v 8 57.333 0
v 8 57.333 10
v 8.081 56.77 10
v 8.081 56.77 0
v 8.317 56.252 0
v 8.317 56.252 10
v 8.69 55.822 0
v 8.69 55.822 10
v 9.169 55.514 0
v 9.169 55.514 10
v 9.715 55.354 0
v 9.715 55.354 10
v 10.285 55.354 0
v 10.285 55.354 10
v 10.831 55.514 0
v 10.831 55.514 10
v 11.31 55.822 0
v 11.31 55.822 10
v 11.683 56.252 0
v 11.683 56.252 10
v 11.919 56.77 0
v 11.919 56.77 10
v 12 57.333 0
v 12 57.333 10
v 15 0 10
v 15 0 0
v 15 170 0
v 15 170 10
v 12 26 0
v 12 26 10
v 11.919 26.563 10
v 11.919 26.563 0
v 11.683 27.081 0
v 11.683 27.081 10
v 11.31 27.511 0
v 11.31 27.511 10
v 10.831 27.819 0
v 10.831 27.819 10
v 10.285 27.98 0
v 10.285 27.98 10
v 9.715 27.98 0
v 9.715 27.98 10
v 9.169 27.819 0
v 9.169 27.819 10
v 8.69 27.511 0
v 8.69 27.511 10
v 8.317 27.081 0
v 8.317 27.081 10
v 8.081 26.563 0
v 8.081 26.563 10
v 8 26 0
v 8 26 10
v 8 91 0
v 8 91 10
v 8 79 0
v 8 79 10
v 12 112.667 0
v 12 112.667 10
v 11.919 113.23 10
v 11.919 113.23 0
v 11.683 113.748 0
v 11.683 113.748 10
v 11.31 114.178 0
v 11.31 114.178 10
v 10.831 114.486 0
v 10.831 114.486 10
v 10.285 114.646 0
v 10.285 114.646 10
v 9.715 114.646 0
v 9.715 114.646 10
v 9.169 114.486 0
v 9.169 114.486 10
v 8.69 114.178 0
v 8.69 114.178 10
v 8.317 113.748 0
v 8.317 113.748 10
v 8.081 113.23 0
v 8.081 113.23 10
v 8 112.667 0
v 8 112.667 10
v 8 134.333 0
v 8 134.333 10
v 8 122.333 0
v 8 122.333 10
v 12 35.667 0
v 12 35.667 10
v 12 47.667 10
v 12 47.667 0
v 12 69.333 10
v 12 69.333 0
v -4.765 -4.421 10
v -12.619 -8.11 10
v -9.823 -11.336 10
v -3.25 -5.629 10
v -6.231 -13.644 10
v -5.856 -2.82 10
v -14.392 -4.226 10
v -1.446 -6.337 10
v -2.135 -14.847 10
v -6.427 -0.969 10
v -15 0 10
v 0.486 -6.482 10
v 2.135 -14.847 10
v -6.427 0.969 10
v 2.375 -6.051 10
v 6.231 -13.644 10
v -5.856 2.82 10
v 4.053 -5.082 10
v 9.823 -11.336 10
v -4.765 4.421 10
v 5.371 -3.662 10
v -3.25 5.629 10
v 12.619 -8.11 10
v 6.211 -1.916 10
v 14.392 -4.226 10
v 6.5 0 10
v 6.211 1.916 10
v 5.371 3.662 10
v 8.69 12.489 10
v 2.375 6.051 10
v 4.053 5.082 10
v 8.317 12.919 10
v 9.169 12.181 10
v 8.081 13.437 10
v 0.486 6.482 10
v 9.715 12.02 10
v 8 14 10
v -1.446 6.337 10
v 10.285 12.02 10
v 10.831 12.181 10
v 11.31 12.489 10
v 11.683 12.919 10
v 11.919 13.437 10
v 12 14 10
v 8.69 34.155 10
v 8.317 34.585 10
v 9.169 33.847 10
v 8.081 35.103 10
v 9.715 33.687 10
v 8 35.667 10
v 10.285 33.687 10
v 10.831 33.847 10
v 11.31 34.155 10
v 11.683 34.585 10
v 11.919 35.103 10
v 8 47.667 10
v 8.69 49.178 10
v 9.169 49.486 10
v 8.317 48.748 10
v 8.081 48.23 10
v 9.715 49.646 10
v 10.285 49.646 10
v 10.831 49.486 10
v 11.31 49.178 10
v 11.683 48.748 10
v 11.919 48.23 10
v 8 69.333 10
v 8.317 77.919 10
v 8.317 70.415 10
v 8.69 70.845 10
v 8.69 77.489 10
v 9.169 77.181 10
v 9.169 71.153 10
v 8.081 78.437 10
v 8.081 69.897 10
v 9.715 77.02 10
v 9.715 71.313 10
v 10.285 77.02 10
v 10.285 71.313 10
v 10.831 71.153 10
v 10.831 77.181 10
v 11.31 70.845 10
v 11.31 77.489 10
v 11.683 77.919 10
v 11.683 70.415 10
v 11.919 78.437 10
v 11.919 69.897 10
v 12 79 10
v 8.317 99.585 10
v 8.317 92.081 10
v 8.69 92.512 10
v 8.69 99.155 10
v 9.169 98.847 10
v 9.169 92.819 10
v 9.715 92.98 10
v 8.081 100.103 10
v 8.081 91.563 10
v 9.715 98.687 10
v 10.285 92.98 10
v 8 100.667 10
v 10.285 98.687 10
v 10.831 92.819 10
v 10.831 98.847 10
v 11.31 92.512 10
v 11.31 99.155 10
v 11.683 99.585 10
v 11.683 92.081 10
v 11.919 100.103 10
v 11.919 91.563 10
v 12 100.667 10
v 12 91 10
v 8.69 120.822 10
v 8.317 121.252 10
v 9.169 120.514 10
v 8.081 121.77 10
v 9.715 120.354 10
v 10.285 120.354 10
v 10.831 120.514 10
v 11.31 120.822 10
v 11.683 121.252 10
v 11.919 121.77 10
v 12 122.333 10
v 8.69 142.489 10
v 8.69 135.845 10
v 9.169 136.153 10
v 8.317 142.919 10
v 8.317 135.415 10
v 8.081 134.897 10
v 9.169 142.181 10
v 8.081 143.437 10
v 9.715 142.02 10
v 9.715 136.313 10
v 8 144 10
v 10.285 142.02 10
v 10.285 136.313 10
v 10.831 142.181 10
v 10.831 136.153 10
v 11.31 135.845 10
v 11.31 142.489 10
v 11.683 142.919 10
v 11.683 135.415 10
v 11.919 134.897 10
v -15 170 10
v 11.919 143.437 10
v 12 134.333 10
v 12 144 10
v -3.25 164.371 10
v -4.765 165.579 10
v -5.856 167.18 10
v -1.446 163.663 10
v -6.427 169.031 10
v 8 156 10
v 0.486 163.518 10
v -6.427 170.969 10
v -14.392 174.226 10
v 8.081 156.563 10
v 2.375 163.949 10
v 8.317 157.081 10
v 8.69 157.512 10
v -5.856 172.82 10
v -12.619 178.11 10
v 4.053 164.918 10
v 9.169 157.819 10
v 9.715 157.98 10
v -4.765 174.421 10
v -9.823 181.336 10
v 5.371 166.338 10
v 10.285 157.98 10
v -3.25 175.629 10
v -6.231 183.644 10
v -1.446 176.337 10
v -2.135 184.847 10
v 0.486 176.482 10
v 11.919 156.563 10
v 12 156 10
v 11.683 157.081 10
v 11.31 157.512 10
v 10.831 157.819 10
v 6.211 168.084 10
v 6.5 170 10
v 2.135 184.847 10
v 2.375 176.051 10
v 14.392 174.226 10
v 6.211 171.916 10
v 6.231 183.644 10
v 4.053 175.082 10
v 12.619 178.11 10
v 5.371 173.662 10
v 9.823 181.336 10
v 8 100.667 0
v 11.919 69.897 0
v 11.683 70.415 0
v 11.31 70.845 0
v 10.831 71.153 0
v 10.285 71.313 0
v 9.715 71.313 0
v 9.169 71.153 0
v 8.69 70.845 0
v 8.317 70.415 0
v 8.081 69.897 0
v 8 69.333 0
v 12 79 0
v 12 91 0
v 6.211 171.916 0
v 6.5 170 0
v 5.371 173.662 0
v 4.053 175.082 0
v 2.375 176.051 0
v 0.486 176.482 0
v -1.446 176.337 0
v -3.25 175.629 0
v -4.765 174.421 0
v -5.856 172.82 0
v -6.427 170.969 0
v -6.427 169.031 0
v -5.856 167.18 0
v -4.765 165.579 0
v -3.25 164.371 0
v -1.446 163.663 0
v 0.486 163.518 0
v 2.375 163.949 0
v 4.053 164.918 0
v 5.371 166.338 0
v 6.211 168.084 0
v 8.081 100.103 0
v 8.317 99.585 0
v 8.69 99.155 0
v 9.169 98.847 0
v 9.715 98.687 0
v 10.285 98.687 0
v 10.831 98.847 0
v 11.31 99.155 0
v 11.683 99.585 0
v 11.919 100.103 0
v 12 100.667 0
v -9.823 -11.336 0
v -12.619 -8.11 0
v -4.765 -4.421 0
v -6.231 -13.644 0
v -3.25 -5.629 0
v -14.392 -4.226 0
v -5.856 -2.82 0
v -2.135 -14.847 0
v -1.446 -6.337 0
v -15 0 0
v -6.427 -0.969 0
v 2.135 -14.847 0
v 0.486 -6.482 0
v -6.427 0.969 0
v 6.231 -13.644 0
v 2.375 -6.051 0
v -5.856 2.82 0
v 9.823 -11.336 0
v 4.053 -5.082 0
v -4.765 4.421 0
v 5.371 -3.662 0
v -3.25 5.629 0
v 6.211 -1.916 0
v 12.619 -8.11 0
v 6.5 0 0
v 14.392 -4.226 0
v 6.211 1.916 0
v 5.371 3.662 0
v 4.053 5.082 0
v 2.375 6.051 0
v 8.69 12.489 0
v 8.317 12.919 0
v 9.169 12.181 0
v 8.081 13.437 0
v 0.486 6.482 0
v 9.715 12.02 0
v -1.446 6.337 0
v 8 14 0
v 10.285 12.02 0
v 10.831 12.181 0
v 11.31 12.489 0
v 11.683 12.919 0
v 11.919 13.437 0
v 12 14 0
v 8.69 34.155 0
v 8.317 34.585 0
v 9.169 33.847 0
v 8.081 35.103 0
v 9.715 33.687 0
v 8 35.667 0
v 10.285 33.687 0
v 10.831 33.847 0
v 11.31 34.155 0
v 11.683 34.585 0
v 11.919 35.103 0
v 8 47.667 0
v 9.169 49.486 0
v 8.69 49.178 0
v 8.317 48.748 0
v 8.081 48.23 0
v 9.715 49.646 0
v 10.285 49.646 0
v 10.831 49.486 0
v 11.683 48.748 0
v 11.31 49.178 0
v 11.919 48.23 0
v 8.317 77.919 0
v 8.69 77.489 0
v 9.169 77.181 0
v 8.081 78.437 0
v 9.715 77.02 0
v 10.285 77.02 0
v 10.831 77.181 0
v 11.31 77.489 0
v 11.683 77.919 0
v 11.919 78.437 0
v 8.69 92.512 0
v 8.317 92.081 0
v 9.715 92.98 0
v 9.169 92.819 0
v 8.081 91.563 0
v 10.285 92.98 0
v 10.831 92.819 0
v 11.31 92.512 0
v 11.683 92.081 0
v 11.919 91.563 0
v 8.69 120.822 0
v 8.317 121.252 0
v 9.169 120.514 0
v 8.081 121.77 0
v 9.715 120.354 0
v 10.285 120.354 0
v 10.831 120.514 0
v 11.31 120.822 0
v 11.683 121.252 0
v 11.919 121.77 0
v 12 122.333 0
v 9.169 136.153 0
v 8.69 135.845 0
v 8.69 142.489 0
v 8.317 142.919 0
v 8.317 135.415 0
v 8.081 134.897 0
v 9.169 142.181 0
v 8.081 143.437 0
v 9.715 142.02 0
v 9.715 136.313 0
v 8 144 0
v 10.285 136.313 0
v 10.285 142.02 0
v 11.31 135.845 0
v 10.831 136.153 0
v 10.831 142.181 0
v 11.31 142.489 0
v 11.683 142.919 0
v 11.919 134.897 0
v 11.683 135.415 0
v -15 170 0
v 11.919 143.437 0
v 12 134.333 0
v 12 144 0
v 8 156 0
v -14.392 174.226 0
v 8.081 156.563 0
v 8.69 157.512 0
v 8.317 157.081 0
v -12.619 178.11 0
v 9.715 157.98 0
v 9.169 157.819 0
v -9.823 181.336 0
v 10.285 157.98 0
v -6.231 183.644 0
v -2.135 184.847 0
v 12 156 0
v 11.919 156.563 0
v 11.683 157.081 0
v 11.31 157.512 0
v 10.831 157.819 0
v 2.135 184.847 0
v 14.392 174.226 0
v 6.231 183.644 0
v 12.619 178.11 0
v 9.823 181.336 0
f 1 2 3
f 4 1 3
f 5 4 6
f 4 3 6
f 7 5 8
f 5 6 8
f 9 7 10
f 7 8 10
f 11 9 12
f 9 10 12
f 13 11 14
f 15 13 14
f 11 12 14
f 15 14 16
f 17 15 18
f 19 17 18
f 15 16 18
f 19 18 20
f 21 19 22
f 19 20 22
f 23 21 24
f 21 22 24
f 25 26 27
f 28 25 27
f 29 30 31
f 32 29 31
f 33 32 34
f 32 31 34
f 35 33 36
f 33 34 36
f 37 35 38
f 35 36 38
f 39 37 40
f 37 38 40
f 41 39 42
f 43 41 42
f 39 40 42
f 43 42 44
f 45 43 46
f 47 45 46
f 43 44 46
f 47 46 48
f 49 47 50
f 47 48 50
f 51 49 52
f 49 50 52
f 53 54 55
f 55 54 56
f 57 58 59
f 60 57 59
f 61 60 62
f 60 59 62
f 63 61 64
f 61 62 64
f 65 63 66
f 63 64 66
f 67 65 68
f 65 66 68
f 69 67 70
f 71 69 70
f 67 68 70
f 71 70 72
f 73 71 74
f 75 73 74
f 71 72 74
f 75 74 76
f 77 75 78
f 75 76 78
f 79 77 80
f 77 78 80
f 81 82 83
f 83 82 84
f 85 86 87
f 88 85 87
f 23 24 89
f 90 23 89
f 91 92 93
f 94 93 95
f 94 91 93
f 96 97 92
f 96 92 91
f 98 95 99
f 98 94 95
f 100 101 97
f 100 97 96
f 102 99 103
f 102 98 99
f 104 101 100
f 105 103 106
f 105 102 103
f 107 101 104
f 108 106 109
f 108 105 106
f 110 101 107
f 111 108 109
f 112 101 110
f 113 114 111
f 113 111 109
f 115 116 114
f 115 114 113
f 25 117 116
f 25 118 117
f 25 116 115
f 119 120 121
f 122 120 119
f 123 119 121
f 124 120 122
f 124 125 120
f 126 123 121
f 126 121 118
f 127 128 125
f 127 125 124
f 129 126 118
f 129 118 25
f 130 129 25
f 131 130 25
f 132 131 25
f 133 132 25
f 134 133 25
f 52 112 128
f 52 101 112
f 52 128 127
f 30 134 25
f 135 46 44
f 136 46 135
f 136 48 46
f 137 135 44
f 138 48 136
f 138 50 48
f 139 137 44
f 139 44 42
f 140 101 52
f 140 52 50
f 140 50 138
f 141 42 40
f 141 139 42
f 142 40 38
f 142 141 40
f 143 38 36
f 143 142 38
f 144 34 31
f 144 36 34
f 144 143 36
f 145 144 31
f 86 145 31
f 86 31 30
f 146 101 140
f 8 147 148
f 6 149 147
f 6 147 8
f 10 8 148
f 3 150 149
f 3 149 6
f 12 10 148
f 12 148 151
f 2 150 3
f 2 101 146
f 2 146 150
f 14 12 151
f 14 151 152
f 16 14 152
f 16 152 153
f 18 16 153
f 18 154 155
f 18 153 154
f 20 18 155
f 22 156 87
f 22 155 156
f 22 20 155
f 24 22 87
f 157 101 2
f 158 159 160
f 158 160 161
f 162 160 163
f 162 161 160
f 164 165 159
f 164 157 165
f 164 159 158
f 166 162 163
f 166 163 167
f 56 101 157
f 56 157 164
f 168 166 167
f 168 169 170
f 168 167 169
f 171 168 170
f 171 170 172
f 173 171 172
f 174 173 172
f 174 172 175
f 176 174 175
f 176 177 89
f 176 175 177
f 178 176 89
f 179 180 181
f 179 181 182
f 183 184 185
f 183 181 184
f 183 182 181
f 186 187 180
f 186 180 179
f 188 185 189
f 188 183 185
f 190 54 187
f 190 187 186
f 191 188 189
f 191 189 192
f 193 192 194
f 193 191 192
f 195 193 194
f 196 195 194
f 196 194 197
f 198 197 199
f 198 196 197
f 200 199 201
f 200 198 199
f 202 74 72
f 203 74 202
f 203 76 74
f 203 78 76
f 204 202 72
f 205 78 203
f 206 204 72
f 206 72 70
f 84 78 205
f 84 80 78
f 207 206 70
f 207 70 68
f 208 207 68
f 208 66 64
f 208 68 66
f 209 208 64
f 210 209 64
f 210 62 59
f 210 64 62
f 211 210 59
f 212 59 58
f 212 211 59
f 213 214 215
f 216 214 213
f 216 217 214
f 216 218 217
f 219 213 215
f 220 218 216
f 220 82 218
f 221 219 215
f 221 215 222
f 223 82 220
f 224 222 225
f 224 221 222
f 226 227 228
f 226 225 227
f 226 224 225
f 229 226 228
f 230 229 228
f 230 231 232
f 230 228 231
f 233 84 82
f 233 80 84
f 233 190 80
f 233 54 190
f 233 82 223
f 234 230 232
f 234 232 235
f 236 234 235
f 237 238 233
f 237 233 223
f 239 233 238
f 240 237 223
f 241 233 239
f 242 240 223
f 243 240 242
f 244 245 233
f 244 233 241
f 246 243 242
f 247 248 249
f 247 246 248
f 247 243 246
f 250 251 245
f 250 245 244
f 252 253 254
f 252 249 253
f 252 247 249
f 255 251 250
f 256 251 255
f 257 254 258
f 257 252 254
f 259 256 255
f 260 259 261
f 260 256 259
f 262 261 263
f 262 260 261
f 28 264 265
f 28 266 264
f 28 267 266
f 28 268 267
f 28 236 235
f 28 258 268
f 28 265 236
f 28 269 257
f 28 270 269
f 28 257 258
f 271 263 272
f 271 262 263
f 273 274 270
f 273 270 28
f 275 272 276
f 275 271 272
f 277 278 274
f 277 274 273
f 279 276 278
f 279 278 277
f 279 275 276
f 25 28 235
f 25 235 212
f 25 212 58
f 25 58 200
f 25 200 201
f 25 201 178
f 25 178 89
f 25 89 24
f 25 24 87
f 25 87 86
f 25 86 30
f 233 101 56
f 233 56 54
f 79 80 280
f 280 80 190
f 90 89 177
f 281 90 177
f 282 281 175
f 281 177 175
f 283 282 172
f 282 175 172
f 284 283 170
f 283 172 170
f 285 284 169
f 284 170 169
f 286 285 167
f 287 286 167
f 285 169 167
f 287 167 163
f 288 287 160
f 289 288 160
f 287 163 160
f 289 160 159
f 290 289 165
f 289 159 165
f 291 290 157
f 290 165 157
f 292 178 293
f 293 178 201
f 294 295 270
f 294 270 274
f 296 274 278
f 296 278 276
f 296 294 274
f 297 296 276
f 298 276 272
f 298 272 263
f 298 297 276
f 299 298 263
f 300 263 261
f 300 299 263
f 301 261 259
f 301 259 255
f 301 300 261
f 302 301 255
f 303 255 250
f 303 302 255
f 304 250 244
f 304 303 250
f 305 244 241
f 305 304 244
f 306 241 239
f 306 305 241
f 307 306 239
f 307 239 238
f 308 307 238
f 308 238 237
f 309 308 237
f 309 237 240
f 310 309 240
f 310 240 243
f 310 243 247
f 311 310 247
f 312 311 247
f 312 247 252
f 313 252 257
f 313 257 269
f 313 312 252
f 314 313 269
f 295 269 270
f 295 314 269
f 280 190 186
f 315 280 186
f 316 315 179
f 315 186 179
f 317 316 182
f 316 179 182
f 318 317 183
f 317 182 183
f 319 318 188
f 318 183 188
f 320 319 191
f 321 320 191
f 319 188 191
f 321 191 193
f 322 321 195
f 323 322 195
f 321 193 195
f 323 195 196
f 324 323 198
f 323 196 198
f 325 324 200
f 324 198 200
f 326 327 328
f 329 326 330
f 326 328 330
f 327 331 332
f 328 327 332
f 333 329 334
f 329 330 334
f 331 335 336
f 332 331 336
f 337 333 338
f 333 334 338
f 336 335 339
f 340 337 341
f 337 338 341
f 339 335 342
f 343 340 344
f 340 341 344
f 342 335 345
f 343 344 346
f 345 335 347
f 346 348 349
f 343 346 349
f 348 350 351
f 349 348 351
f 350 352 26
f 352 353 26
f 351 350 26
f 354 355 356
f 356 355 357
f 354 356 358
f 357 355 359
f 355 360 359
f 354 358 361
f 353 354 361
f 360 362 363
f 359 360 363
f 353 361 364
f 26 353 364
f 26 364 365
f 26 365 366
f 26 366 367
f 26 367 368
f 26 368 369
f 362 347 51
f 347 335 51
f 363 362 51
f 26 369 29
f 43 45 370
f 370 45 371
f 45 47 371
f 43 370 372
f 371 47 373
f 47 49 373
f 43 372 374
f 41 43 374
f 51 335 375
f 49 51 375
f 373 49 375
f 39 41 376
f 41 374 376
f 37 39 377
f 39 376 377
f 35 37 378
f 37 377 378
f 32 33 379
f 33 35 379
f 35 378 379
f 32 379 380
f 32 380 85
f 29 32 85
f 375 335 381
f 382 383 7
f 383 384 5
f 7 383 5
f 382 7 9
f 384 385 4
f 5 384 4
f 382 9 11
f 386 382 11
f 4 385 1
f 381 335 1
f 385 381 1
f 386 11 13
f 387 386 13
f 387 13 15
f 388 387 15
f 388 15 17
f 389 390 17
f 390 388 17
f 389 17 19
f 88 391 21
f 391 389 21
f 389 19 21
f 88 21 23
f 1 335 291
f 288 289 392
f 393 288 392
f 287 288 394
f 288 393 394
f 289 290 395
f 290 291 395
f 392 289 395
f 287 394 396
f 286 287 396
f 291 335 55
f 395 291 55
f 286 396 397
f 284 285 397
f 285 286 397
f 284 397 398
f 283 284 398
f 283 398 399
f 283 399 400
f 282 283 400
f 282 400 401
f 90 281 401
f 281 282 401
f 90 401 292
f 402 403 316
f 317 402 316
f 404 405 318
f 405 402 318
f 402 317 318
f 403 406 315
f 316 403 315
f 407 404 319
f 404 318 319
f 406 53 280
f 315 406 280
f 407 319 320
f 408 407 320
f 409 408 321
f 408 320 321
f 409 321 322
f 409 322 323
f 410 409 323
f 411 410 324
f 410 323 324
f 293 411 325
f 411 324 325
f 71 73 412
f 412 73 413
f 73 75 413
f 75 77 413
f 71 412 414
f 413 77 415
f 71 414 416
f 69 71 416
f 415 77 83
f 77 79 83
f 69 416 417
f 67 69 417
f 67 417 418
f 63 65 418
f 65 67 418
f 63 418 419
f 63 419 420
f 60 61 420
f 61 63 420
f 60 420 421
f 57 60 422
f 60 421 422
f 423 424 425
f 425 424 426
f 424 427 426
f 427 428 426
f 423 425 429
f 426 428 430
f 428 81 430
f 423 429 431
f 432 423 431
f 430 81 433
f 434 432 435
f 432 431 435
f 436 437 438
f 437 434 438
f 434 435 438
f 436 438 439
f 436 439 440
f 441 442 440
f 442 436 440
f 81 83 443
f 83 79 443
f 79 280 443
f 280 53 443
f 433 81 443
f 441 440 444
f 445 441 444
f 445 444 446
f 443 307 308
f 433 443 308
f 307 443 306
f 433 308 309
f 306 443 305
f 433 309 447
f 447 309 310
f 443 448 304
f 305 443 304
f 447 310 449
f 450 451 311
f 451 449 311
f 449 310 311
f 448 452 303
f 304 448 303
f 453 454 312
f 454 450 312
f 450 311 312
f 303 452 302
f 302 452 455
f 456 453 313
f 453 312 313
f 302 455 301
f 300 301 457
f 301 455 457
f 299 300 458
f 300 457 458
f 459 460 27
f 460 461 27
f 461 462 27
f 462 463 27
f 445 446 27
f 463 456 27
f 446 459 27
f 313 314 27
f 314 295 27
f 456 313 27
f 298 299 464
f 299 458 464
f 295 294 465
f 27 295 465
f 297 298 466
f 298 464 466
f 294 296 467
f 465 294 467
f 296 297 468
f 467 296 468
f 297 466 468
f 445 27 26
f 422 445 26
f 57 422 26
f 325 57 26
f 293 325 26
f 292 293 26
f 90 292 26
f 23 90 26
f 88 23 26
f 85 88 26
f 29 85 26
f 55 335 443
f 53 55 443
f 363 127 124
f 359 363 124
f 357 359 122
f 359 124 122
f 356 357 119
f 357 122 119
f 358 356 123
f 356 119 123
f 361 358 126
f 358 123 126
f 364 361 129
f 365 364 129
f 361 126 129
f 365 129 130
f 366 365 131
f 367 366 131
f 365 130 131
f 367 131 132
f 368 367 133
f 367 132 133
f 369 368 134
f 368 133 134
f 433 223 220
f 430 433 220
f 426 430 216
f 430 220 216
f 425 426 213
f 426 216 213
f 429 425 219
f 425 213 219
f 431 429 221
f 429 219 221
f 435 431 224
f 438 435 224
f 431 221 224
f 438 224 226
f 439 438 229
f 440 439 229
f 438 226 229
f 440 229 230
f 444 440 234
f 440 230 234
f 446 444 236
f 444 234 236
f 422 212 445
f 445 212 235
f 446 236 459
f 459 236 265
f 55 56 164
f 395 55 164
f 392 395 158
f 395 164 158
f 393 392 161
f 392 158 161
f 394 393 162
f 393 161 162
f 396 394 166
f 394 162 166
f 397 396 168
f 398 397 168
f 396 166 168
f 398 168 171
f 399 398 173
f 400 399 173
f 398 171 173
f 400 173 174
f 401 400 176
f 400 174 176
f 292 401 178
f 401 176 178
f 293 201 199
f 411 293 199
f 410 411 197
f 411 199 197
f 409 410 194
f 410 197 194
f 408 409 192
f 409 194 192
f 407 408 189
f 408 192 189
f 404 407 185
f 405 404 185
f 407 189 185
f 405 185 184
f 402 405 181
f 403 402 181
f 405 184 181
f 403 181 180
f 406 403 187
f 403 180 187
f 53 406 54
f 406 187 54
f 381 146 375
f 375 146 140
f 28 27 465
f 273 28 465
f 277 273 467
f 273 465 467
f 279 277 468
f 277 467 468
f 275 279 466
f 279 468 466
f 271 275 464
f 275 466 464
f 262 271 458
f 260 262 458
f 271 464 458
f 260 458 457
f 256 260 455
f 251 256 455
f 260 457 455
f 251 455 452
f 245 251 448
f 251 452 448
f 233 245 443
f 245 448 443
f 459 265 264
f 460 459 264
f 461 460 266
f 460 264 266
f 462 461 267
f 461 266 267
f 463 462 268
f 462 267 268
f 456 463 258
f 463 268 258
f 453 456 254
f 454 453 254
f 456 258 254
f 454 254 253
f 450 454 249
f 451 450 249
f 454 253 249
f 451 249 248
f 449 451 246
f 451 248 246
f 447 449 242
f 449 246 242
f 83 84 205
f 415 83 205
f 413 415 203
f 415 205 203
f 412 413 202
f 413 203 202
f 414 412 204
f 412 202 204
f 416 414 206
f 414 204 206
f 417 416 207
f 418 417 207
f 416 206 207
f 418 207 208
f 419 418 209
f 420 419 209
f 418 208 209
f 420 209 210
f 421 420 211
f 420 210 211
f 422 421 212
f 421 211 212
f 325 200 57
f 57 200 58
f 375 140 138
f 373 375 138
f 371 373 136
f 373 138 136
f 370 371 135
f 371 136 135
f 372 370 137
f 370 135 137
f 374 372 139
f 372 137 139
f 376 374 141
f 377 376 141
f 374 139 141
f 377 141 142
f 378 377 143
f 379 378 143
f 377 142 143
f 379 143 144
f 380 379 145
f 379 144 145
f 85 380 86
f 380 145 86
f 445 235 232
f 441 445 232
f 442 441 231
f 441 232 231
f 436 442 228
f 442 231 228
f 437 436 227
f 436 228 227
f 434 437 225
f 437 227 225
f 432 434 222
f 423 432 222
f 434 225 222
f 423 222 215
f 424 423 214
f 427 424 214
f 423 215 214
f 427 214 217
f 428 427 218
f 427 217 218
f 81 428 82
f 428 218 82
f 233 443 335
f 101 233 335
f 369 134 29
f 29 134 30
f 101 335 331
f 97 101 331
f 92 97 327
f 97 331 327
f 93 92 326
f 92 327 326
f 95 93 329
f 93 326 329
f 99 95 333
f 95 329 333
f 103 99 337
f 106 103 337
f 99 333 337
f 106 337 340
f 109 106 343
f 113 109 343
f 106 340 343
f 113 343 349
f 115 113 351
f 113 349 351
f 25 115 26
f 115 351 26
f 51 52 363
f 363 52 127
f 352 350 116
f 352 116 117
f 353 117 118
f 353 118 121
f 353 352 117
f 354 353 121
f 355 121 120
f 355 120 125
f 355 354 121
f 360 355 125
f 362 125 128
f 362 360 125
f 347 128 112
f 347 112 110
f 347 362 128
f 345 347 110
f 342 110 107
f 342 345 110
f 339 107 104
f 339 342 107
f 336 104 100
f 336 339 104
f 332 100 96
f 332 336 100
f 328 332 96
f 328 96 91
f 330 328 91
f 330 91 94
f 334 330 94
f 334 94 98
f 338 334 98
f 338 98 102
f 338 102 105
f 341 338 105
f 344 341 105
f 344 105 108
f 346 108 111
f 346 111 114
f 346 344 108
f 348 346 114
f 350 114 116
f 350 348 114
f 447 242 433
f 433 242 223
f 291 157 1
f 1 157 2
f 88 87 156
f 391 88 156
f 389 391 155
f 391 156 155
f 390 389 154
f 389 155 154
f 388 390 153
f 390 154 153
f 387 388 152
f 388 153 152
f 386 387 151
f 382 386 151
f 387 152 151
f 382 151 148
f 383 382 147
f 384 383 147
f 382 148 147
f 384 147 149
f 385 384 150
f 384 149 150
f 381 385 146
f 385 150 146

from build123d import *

# Parameters (mm, degrees)
SKETCH_R            = 6.5
PAD_DEPTH           = 10
POCKET_DEPTH        = 12
LINEARPATTERN_COUNT = 7
LINEARPATTERN_PITCH = 21.666667


with BuildPart() as part:
    # Sketch → Pad (new body)
    with BuildSketch(Plane.XY):
        with BuildLine():
            ThreePointArc((-15, 0), (0, -15), (15, 0))
            Line((15, 0), (15, 170))
            ThreePointArc((15, 170), (0, 185), (-15, 170))
            Line((-15, 170), (-15, 0))
        make_face()
        Circle(SKETCH_R, mode=Mode.SUBTRACT)
        with Locations((0, 170)):
            Circle(SKETCH_R, mode=Mode.SUBTRACT)
    extrude(amount=PAD_DEPTH)

    # Sketch001 (on Face8 of Pad) → Pocket (cut)
    with BuildSketch(Plane.XY.offset(10)):
        with BuildLine():
            ThreePointArc((12, 26), (10, 28), (8, 26))
            Line((8, 26), (8, 14))
            ThreePointArc((8, 14), (10, 12), (12, 14))
            Line((12, 14), (12, 26))
        make_face()
    pocket = extrude(amount=-POCKET_DEPTH, mode=Mode.SUBTRACT)

    # LinearPattern: Pocket ×7
    with Locations(*[(0, i * LINEARPATTERN_PITCH, 0) for i in range(1, LINEARPATTERN_COUNT)]):
        add(pocket, mode=Mode.SUBTRACT)


solid = part.part
